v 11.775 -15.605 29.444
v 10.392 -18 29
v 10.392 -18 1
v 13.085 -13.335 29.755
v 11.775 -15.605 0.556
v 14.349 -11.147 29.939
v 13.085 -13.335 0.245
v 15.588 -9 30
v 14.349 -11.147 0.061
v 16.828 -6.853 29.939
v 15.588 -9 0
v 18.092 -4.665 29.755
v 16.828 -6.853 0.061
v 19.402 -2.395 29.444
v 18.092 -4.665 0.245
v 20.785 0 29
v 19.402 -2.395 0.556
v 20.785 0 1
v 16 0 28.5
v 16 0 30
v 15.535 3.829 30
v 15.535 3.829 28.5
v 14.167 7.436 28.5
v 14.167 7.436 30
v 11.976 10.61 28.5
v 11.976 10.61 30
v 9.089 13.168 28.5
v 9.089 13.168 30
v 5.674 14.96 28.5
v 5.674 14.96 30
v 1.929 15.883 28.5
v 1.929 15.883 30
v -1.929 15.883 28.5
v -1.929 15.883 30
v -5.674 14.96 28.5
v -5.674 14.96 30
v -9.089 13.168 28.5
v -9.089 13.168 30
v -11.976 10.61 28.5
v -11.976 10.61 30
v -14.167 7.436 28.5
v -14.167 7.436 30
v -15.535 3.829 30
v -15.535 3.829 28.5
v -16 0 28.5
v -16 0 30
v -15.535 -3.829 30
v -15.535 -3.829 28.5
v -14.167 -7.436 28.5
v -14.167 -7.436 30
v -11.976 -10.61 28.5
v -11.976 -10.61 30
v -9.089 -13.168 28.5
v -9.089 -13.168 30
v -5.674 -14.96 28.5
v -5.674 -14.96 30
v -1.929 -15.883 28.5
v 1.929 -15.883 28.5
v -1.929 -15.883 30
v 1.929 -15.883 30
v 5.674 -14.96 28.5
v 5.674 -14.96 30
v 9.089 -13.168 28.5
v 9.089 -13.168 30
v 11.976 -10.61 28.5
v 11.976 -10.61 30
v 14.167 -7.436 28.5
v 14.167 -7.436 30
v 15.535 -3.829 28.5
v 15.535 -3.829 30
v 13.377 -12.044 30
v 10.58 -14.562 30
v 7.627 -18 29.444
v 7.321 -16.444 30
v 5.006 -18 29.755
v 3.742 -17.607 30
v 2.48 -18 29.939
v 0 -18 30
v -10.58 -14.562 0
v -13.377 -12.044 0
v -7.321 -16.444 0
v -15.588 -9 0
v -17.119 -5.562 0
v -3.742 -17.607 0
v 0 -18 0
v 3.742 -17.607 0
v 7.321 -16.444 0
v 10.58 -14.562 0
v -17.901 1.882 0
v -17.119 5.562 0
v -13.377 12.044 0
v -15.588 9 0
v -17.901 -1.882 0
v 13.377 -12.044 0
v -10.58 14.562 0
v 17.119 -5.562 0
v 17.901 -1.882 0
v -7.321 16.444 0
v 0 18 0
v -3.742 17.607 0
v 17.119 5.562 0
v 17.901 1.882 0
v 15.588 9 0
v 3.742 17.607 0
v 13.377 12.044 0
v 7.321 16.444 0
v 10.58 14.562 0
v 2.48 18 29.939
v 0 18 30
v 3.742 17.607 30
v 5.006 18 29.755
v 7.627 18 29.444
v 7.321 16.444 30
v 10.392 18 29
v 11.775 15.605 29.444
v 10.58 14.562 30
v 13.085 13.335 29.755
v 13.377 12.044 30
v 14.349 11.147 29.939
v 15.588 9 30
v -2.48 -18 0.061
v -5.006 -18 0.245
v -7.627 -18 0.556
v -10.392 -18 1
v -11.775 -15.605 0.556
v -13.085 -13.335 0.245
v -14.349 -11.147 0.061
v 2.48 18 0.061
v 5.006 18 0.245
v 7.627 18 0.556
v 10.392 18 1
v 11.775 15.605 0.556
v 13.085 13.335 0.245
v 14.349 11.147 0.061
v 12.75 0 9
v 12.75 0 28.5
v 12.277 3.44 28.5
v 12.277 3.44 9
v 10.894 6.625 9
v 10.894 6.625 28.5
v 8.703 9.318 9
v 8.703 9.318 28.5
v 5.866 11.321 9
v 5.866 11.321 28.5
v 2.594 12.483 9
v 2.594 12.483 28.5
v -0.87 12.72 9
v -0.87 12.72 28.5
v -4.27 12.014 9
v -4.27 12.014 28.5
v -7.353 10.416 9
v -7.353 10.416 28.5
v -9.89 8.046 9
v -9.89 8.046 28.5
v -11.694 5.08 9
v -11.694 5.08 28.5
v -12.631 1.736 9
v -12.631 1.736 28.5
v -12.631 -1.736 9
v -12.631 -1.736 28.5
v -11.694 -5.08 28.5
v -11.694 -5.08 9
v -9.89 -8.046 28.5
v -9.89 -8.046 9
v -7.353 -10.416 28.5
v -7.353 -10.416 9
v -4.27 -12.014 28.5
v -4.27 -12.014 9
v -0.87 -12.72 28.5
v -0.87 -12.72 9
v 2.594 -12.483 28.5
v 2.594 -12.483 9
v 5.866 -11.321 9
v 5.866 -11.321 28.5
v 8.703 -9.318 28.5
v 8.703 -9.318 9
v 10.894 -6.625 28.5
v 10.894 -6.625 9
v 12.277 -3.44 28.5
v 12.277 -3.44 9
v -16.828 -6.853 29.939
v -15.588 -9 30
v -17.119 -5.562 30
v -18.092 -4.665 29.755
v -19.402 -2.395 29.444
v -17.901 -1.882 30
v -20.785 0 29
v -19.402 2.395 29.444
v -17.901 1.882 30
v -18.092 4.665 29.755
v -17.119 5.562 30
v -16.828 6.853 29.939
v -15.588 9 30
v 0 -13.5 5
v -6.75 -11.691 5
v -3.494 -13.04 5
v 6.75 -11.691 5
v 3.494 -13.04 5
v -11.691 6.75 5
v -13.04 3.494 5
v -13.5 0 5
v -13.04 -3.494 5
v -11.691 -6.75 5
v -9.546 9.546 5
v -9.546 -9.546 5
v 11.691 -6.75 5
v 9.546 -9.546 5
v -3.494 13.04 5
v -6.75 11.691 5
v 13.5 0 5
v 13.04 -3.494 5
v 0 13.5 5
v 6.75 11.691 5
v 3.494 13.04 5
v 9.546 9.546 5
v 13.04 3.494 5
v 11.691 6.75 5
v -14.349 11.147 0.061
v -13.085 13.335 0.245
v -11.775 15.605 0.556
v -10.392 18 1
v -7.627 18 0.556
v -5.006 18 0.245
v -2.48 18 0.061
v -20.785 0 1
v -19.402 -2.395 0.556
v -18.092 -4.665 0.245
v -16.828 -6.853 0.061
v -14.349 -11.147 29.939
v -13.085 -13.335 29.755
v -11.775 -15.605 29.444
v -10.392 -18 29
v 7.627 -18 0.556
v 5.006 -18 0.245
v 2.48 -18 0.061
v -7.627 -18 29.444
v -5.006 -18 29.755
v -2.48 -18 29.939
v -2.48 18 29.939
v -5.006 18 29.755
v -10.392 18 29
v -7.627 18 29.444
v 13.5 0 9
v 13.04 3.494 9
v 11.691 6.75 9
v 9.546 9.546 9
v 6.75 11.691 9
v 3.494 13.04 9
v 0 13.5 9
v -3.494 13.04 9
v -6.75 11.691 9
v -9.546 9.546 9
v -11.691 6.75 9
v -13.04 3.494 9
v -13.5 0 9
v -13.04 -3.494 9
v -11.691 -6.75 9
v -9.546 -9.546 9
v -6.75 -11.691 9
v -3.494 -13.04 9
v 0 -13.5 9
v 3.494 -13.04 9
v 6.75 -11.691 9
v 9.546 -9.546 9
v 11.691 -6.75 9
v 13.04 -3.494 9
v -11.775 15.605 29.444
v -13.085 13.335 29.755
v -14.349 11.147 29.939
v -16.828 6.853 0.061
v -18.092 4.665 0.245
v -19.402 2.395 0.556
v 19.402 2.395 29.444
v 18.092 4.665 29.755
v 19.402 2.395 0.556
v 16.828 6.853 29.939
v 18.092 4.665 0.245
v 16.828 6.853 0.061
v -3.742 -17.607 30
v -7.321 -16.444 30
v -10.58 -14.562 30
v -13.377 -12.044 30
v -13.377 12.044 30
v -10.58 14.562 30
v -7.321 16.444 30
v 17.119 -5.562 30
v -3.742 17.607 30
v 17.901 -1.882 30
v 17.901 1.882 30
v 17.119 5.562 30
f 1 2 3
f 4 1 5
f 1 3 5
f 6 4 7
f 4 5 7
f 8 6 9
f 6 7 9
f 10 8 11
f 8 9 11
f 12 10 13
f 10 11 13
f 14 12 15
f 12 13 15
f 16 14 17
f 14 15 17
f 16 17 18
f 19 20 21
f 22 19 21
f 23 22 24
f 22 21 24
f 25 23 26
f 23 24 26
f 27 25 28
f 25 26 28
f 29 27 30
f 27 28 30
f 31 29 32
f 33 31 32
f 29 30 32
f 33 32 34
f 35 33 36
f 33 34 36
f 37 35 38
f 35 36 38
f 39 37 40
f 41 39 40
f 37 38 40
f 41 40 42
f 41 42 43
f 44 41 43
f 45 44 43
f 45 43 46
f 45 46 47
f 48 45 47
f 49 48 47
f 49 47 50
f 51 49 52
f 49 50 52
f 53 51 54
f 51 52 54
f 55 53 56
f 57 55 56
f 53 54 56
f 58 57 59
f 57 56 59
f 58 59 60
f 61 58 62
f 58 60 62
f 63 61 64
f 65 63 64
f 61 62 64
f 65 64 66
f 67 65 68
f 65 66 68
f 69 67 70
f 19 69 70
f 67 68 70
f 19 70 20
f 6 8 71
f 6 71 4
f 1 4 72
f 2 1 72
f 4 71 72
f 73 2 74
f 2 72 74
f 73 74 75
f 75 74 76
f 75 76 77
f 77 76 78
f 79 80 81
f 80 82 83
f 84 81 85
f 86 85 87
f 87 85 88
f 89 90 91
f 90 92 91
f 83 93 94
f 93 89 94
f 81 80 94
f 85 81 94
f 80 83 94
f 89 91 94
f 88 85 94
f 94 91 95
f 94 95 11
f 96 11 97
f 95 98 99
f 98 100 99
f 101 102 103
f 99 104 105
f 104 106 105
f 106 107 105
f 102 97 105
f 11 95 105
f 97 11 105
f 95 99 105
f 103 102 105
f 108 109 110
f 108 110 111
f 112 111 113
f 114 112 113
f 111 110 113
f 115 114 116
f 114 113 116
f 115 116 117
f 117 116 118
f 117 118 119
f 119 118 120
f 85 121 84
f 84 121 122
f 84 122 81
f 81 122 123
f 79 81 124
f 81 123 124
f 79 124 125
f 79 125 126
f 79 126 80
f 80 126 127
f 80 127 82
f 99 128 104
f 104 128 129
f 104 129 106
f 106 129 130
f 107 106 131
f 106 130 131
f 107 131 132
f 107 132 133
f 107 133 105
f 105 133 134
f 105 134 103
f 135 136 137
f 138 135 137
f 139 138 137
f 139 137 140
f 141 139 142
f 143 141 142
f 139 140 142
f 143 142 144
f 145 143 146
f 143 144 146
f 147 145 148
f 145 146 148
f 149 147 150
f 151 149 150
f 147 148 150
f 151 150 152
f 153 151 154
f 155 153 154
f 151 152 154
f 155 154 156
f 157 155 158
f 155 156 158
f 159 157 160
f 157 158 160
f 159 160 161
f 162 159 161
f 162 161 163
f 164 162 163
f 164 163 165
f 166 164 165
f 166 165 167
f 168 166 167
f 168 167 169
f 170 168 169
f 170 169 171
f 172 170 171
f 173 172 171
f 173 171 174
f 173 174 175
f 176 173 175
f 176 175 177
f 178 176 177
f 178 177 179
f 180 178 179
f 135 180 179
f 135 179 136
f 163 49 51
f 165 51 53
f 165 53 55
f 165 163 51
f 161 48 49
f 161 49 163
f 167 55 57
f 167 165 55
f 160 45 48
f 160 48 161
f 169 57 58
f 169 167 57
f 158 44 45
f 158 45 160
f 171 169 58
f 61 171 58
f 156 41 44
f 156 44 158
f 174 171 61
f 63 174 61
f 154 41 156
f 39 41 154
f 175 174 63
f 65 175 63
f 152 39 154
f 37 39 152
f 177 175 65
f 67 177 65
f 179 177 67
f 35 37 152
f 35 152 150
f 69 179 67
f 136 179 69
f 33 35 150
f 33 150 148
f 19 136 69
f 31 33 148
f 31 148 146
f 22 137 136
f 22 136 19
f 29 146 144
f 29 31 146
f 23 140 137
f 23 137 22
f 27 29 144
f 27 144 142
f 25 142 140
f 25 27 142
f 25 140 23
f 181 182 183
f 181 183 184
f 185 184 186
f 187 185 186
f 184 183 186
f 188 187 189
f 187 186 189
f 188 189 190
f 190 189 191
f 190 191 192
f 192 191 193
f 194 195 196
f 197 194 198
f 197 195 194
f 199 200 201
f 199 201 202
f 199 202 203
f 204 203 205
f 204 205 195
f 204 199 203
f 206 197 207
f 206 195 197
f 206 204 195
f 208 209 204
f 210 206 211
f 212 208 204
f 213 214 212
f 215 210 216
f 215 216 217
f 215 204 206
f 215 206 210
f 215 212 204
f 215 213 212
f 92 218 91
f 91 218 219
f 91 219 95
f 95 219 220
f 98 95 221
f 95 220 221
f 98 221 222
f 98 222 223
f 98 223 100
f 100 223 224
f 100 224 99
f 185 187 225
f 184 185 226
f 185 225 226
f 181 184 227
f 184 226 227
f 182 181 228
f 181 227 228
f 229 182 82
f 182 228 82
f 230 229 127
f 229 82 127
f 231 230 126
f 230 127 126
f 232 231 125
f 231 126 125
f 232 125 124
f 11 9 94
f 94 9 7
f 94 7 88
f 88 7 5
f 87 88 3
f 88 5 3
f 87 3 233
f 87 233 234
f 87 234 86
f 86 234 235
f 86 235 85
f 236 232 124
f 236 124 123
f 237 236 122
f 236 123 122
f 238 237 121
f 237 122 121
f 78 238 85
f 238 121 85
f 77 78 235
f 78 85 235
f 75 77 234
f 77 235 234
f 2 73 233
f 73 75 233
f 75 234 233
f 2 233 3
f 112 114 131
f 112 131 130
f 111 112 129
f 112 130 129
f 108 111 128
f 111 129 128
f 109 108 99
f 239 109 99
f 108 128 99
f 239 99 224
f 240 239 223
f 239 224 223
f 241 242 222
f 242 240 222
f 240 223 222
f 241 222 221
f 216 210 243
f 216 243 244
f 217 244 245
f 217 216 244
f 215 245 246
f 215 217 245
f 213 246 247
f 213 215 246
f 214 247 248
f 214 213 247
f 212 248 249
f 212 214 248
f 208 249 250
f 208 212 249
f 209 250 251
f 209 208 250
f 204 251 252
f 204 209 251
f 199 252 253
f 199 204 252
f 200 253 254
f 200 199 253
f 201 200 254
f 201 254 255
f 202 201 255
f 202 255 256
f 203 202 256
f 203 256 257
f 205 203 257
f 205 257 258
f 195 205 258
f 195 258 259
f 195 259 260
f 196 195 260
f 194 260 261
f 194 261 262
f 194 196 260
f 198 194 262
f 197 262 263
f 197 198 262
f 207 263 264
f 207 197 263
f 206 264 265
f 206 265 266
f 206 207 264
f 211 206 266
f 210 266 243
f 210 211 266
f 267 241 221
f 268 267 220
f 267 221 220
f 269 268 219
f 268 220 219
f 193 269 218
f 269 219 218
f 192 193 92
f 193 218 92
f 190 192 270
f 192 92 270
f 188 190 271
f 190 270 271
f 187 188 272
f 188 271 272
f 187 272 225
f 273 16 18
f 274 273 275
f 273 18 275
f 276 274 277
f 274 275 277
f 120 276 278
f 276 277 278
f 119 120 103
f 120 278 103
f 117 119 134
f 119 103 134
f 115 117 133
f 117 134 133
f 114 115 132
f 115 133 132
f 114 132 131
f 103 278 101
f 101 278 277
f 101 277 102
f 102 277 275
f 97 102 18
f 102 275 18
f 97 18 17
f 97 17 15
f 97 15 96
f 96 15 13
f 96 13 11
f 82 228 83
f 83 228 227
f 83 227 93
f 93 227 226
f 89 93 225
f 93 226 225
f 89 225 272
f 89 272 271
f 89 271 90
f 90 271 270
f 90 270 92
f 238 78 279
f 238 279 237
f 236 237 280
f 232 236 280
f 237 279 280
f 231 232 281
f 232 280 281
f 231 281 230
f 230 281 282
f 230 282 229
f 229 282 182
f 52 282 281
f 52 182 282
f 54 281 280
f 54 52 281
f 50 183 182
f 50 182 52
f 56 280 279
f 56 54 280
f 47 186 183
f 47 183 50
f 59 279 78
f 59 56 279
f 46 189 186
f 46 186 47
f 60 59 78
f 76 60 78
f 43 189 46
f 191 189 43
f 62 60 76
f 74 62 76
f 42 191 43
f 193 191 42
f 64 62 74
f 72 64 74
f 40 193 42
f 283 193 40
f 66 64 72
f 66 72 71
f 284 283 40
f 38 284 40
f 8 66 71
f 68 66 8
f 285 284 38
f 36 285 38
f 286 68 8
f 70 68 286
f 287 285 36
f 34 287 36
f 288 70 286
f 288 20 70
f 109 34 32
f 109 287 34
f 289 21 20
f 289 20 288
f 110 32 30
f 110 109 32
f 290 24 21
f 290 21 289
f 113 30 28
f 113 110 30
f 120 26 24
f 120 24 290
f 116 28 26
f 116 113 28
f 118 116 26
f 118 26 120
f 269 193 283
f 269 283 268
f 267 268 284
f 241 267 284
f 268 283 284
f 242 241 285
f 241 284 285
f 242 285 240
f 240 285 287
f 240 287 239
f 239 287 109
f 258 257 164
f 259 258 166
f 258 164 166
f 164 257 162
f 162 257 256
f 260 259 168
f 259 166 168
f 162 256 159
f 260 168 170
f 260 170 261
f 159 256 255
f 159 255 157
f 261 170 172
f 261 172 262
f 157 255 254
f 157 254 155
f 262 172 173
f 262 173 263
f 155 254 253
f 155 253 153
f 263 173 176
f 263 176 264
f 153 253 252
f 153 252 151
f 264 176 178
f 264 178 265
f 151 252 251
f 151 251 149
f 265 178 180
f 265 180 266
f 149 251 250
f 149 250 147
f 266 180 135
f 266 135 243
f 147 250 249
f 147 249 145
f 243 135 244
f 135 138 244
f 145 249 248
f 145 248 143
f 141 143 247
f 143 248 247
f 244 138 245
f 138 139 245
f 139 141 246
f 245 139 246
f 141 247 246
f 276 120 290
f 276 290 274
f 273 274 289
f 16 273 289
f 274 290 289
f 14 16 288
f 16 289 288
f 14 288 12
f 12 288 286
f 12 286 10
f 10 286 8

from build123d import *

# Parameters (mm, degrees)
EXTRUDE_1_DEPTH     = 30
SKETCH_2_R          = 12.75
CUT_EXTRUDE_1_DEPTH = 25
SKETCH_3_R          = 13.5
CUT_EXTRUDE_2_DEPTH = 4
SKETCH_4_R          = 16
CUT_EXTRUDE_3_DEPTH = 1.5


with BuildPart() as part:
    # Эскиз1 → Вытянуть1 (new body)
    with BuildSketch(Plane.XY):
        Polygon((10.392304845, 18), (-10.392304845, 18), (-20.784609691, 0), (-10.392304845, -18), (10.392304845, -18), (20.784609691, 0), align=None)
    extrude(amount=EXTRUDE_1_DEPTH)

    # Эскиз2 → Вырез-Вытянуть1 (cut)
    with BuildSketch(Plane.XY.offset(30)):
        Circle(SKETCH_2_R)
    extrude(amount=-CUT_EXTRUDE_1_DEPTH, mode=Mode.SUBTRACT)

    # Эскиз3 → Вырез-Вытянуть2 (cut)
    with BuildSketch(Plane.XY.offset(5)):
        Circle(SKETCH_3_R)
    extrude(amount=CUT_EXTRUDE_2_DEPTH, mode=Mode.SUBTRACT)

    # Эскиз4 → Вырез-Вытянуть3 (cut)
    with BuildSketch(Plane.XY.offset(30)):
        Circle(SKETCH_4_R)
    extrude(amount=-CUT_EXTRUDE_3_DEPTH, mode=Mode.SUBTRACT)

    # Эскиз5 → Вырез-Повернуть1 (revolve, cut)
    with BuildSketch(Plane(origin=(0, 0, 0), x_dir=(1, 0, 0), z_dir=(0, 1, 0))):
        Polygon((20.784609691, -30), (20.784609691, -29), (18, -30), align=None)
        Polygon((20.784609691, 0), (18, 0), (20.784609691, -1), align=None)
    revolve(axis=Axis((0, 0, 28.5), (0, 0, -1)), mode=Mode.SUBTRACT)


solid = part.part
